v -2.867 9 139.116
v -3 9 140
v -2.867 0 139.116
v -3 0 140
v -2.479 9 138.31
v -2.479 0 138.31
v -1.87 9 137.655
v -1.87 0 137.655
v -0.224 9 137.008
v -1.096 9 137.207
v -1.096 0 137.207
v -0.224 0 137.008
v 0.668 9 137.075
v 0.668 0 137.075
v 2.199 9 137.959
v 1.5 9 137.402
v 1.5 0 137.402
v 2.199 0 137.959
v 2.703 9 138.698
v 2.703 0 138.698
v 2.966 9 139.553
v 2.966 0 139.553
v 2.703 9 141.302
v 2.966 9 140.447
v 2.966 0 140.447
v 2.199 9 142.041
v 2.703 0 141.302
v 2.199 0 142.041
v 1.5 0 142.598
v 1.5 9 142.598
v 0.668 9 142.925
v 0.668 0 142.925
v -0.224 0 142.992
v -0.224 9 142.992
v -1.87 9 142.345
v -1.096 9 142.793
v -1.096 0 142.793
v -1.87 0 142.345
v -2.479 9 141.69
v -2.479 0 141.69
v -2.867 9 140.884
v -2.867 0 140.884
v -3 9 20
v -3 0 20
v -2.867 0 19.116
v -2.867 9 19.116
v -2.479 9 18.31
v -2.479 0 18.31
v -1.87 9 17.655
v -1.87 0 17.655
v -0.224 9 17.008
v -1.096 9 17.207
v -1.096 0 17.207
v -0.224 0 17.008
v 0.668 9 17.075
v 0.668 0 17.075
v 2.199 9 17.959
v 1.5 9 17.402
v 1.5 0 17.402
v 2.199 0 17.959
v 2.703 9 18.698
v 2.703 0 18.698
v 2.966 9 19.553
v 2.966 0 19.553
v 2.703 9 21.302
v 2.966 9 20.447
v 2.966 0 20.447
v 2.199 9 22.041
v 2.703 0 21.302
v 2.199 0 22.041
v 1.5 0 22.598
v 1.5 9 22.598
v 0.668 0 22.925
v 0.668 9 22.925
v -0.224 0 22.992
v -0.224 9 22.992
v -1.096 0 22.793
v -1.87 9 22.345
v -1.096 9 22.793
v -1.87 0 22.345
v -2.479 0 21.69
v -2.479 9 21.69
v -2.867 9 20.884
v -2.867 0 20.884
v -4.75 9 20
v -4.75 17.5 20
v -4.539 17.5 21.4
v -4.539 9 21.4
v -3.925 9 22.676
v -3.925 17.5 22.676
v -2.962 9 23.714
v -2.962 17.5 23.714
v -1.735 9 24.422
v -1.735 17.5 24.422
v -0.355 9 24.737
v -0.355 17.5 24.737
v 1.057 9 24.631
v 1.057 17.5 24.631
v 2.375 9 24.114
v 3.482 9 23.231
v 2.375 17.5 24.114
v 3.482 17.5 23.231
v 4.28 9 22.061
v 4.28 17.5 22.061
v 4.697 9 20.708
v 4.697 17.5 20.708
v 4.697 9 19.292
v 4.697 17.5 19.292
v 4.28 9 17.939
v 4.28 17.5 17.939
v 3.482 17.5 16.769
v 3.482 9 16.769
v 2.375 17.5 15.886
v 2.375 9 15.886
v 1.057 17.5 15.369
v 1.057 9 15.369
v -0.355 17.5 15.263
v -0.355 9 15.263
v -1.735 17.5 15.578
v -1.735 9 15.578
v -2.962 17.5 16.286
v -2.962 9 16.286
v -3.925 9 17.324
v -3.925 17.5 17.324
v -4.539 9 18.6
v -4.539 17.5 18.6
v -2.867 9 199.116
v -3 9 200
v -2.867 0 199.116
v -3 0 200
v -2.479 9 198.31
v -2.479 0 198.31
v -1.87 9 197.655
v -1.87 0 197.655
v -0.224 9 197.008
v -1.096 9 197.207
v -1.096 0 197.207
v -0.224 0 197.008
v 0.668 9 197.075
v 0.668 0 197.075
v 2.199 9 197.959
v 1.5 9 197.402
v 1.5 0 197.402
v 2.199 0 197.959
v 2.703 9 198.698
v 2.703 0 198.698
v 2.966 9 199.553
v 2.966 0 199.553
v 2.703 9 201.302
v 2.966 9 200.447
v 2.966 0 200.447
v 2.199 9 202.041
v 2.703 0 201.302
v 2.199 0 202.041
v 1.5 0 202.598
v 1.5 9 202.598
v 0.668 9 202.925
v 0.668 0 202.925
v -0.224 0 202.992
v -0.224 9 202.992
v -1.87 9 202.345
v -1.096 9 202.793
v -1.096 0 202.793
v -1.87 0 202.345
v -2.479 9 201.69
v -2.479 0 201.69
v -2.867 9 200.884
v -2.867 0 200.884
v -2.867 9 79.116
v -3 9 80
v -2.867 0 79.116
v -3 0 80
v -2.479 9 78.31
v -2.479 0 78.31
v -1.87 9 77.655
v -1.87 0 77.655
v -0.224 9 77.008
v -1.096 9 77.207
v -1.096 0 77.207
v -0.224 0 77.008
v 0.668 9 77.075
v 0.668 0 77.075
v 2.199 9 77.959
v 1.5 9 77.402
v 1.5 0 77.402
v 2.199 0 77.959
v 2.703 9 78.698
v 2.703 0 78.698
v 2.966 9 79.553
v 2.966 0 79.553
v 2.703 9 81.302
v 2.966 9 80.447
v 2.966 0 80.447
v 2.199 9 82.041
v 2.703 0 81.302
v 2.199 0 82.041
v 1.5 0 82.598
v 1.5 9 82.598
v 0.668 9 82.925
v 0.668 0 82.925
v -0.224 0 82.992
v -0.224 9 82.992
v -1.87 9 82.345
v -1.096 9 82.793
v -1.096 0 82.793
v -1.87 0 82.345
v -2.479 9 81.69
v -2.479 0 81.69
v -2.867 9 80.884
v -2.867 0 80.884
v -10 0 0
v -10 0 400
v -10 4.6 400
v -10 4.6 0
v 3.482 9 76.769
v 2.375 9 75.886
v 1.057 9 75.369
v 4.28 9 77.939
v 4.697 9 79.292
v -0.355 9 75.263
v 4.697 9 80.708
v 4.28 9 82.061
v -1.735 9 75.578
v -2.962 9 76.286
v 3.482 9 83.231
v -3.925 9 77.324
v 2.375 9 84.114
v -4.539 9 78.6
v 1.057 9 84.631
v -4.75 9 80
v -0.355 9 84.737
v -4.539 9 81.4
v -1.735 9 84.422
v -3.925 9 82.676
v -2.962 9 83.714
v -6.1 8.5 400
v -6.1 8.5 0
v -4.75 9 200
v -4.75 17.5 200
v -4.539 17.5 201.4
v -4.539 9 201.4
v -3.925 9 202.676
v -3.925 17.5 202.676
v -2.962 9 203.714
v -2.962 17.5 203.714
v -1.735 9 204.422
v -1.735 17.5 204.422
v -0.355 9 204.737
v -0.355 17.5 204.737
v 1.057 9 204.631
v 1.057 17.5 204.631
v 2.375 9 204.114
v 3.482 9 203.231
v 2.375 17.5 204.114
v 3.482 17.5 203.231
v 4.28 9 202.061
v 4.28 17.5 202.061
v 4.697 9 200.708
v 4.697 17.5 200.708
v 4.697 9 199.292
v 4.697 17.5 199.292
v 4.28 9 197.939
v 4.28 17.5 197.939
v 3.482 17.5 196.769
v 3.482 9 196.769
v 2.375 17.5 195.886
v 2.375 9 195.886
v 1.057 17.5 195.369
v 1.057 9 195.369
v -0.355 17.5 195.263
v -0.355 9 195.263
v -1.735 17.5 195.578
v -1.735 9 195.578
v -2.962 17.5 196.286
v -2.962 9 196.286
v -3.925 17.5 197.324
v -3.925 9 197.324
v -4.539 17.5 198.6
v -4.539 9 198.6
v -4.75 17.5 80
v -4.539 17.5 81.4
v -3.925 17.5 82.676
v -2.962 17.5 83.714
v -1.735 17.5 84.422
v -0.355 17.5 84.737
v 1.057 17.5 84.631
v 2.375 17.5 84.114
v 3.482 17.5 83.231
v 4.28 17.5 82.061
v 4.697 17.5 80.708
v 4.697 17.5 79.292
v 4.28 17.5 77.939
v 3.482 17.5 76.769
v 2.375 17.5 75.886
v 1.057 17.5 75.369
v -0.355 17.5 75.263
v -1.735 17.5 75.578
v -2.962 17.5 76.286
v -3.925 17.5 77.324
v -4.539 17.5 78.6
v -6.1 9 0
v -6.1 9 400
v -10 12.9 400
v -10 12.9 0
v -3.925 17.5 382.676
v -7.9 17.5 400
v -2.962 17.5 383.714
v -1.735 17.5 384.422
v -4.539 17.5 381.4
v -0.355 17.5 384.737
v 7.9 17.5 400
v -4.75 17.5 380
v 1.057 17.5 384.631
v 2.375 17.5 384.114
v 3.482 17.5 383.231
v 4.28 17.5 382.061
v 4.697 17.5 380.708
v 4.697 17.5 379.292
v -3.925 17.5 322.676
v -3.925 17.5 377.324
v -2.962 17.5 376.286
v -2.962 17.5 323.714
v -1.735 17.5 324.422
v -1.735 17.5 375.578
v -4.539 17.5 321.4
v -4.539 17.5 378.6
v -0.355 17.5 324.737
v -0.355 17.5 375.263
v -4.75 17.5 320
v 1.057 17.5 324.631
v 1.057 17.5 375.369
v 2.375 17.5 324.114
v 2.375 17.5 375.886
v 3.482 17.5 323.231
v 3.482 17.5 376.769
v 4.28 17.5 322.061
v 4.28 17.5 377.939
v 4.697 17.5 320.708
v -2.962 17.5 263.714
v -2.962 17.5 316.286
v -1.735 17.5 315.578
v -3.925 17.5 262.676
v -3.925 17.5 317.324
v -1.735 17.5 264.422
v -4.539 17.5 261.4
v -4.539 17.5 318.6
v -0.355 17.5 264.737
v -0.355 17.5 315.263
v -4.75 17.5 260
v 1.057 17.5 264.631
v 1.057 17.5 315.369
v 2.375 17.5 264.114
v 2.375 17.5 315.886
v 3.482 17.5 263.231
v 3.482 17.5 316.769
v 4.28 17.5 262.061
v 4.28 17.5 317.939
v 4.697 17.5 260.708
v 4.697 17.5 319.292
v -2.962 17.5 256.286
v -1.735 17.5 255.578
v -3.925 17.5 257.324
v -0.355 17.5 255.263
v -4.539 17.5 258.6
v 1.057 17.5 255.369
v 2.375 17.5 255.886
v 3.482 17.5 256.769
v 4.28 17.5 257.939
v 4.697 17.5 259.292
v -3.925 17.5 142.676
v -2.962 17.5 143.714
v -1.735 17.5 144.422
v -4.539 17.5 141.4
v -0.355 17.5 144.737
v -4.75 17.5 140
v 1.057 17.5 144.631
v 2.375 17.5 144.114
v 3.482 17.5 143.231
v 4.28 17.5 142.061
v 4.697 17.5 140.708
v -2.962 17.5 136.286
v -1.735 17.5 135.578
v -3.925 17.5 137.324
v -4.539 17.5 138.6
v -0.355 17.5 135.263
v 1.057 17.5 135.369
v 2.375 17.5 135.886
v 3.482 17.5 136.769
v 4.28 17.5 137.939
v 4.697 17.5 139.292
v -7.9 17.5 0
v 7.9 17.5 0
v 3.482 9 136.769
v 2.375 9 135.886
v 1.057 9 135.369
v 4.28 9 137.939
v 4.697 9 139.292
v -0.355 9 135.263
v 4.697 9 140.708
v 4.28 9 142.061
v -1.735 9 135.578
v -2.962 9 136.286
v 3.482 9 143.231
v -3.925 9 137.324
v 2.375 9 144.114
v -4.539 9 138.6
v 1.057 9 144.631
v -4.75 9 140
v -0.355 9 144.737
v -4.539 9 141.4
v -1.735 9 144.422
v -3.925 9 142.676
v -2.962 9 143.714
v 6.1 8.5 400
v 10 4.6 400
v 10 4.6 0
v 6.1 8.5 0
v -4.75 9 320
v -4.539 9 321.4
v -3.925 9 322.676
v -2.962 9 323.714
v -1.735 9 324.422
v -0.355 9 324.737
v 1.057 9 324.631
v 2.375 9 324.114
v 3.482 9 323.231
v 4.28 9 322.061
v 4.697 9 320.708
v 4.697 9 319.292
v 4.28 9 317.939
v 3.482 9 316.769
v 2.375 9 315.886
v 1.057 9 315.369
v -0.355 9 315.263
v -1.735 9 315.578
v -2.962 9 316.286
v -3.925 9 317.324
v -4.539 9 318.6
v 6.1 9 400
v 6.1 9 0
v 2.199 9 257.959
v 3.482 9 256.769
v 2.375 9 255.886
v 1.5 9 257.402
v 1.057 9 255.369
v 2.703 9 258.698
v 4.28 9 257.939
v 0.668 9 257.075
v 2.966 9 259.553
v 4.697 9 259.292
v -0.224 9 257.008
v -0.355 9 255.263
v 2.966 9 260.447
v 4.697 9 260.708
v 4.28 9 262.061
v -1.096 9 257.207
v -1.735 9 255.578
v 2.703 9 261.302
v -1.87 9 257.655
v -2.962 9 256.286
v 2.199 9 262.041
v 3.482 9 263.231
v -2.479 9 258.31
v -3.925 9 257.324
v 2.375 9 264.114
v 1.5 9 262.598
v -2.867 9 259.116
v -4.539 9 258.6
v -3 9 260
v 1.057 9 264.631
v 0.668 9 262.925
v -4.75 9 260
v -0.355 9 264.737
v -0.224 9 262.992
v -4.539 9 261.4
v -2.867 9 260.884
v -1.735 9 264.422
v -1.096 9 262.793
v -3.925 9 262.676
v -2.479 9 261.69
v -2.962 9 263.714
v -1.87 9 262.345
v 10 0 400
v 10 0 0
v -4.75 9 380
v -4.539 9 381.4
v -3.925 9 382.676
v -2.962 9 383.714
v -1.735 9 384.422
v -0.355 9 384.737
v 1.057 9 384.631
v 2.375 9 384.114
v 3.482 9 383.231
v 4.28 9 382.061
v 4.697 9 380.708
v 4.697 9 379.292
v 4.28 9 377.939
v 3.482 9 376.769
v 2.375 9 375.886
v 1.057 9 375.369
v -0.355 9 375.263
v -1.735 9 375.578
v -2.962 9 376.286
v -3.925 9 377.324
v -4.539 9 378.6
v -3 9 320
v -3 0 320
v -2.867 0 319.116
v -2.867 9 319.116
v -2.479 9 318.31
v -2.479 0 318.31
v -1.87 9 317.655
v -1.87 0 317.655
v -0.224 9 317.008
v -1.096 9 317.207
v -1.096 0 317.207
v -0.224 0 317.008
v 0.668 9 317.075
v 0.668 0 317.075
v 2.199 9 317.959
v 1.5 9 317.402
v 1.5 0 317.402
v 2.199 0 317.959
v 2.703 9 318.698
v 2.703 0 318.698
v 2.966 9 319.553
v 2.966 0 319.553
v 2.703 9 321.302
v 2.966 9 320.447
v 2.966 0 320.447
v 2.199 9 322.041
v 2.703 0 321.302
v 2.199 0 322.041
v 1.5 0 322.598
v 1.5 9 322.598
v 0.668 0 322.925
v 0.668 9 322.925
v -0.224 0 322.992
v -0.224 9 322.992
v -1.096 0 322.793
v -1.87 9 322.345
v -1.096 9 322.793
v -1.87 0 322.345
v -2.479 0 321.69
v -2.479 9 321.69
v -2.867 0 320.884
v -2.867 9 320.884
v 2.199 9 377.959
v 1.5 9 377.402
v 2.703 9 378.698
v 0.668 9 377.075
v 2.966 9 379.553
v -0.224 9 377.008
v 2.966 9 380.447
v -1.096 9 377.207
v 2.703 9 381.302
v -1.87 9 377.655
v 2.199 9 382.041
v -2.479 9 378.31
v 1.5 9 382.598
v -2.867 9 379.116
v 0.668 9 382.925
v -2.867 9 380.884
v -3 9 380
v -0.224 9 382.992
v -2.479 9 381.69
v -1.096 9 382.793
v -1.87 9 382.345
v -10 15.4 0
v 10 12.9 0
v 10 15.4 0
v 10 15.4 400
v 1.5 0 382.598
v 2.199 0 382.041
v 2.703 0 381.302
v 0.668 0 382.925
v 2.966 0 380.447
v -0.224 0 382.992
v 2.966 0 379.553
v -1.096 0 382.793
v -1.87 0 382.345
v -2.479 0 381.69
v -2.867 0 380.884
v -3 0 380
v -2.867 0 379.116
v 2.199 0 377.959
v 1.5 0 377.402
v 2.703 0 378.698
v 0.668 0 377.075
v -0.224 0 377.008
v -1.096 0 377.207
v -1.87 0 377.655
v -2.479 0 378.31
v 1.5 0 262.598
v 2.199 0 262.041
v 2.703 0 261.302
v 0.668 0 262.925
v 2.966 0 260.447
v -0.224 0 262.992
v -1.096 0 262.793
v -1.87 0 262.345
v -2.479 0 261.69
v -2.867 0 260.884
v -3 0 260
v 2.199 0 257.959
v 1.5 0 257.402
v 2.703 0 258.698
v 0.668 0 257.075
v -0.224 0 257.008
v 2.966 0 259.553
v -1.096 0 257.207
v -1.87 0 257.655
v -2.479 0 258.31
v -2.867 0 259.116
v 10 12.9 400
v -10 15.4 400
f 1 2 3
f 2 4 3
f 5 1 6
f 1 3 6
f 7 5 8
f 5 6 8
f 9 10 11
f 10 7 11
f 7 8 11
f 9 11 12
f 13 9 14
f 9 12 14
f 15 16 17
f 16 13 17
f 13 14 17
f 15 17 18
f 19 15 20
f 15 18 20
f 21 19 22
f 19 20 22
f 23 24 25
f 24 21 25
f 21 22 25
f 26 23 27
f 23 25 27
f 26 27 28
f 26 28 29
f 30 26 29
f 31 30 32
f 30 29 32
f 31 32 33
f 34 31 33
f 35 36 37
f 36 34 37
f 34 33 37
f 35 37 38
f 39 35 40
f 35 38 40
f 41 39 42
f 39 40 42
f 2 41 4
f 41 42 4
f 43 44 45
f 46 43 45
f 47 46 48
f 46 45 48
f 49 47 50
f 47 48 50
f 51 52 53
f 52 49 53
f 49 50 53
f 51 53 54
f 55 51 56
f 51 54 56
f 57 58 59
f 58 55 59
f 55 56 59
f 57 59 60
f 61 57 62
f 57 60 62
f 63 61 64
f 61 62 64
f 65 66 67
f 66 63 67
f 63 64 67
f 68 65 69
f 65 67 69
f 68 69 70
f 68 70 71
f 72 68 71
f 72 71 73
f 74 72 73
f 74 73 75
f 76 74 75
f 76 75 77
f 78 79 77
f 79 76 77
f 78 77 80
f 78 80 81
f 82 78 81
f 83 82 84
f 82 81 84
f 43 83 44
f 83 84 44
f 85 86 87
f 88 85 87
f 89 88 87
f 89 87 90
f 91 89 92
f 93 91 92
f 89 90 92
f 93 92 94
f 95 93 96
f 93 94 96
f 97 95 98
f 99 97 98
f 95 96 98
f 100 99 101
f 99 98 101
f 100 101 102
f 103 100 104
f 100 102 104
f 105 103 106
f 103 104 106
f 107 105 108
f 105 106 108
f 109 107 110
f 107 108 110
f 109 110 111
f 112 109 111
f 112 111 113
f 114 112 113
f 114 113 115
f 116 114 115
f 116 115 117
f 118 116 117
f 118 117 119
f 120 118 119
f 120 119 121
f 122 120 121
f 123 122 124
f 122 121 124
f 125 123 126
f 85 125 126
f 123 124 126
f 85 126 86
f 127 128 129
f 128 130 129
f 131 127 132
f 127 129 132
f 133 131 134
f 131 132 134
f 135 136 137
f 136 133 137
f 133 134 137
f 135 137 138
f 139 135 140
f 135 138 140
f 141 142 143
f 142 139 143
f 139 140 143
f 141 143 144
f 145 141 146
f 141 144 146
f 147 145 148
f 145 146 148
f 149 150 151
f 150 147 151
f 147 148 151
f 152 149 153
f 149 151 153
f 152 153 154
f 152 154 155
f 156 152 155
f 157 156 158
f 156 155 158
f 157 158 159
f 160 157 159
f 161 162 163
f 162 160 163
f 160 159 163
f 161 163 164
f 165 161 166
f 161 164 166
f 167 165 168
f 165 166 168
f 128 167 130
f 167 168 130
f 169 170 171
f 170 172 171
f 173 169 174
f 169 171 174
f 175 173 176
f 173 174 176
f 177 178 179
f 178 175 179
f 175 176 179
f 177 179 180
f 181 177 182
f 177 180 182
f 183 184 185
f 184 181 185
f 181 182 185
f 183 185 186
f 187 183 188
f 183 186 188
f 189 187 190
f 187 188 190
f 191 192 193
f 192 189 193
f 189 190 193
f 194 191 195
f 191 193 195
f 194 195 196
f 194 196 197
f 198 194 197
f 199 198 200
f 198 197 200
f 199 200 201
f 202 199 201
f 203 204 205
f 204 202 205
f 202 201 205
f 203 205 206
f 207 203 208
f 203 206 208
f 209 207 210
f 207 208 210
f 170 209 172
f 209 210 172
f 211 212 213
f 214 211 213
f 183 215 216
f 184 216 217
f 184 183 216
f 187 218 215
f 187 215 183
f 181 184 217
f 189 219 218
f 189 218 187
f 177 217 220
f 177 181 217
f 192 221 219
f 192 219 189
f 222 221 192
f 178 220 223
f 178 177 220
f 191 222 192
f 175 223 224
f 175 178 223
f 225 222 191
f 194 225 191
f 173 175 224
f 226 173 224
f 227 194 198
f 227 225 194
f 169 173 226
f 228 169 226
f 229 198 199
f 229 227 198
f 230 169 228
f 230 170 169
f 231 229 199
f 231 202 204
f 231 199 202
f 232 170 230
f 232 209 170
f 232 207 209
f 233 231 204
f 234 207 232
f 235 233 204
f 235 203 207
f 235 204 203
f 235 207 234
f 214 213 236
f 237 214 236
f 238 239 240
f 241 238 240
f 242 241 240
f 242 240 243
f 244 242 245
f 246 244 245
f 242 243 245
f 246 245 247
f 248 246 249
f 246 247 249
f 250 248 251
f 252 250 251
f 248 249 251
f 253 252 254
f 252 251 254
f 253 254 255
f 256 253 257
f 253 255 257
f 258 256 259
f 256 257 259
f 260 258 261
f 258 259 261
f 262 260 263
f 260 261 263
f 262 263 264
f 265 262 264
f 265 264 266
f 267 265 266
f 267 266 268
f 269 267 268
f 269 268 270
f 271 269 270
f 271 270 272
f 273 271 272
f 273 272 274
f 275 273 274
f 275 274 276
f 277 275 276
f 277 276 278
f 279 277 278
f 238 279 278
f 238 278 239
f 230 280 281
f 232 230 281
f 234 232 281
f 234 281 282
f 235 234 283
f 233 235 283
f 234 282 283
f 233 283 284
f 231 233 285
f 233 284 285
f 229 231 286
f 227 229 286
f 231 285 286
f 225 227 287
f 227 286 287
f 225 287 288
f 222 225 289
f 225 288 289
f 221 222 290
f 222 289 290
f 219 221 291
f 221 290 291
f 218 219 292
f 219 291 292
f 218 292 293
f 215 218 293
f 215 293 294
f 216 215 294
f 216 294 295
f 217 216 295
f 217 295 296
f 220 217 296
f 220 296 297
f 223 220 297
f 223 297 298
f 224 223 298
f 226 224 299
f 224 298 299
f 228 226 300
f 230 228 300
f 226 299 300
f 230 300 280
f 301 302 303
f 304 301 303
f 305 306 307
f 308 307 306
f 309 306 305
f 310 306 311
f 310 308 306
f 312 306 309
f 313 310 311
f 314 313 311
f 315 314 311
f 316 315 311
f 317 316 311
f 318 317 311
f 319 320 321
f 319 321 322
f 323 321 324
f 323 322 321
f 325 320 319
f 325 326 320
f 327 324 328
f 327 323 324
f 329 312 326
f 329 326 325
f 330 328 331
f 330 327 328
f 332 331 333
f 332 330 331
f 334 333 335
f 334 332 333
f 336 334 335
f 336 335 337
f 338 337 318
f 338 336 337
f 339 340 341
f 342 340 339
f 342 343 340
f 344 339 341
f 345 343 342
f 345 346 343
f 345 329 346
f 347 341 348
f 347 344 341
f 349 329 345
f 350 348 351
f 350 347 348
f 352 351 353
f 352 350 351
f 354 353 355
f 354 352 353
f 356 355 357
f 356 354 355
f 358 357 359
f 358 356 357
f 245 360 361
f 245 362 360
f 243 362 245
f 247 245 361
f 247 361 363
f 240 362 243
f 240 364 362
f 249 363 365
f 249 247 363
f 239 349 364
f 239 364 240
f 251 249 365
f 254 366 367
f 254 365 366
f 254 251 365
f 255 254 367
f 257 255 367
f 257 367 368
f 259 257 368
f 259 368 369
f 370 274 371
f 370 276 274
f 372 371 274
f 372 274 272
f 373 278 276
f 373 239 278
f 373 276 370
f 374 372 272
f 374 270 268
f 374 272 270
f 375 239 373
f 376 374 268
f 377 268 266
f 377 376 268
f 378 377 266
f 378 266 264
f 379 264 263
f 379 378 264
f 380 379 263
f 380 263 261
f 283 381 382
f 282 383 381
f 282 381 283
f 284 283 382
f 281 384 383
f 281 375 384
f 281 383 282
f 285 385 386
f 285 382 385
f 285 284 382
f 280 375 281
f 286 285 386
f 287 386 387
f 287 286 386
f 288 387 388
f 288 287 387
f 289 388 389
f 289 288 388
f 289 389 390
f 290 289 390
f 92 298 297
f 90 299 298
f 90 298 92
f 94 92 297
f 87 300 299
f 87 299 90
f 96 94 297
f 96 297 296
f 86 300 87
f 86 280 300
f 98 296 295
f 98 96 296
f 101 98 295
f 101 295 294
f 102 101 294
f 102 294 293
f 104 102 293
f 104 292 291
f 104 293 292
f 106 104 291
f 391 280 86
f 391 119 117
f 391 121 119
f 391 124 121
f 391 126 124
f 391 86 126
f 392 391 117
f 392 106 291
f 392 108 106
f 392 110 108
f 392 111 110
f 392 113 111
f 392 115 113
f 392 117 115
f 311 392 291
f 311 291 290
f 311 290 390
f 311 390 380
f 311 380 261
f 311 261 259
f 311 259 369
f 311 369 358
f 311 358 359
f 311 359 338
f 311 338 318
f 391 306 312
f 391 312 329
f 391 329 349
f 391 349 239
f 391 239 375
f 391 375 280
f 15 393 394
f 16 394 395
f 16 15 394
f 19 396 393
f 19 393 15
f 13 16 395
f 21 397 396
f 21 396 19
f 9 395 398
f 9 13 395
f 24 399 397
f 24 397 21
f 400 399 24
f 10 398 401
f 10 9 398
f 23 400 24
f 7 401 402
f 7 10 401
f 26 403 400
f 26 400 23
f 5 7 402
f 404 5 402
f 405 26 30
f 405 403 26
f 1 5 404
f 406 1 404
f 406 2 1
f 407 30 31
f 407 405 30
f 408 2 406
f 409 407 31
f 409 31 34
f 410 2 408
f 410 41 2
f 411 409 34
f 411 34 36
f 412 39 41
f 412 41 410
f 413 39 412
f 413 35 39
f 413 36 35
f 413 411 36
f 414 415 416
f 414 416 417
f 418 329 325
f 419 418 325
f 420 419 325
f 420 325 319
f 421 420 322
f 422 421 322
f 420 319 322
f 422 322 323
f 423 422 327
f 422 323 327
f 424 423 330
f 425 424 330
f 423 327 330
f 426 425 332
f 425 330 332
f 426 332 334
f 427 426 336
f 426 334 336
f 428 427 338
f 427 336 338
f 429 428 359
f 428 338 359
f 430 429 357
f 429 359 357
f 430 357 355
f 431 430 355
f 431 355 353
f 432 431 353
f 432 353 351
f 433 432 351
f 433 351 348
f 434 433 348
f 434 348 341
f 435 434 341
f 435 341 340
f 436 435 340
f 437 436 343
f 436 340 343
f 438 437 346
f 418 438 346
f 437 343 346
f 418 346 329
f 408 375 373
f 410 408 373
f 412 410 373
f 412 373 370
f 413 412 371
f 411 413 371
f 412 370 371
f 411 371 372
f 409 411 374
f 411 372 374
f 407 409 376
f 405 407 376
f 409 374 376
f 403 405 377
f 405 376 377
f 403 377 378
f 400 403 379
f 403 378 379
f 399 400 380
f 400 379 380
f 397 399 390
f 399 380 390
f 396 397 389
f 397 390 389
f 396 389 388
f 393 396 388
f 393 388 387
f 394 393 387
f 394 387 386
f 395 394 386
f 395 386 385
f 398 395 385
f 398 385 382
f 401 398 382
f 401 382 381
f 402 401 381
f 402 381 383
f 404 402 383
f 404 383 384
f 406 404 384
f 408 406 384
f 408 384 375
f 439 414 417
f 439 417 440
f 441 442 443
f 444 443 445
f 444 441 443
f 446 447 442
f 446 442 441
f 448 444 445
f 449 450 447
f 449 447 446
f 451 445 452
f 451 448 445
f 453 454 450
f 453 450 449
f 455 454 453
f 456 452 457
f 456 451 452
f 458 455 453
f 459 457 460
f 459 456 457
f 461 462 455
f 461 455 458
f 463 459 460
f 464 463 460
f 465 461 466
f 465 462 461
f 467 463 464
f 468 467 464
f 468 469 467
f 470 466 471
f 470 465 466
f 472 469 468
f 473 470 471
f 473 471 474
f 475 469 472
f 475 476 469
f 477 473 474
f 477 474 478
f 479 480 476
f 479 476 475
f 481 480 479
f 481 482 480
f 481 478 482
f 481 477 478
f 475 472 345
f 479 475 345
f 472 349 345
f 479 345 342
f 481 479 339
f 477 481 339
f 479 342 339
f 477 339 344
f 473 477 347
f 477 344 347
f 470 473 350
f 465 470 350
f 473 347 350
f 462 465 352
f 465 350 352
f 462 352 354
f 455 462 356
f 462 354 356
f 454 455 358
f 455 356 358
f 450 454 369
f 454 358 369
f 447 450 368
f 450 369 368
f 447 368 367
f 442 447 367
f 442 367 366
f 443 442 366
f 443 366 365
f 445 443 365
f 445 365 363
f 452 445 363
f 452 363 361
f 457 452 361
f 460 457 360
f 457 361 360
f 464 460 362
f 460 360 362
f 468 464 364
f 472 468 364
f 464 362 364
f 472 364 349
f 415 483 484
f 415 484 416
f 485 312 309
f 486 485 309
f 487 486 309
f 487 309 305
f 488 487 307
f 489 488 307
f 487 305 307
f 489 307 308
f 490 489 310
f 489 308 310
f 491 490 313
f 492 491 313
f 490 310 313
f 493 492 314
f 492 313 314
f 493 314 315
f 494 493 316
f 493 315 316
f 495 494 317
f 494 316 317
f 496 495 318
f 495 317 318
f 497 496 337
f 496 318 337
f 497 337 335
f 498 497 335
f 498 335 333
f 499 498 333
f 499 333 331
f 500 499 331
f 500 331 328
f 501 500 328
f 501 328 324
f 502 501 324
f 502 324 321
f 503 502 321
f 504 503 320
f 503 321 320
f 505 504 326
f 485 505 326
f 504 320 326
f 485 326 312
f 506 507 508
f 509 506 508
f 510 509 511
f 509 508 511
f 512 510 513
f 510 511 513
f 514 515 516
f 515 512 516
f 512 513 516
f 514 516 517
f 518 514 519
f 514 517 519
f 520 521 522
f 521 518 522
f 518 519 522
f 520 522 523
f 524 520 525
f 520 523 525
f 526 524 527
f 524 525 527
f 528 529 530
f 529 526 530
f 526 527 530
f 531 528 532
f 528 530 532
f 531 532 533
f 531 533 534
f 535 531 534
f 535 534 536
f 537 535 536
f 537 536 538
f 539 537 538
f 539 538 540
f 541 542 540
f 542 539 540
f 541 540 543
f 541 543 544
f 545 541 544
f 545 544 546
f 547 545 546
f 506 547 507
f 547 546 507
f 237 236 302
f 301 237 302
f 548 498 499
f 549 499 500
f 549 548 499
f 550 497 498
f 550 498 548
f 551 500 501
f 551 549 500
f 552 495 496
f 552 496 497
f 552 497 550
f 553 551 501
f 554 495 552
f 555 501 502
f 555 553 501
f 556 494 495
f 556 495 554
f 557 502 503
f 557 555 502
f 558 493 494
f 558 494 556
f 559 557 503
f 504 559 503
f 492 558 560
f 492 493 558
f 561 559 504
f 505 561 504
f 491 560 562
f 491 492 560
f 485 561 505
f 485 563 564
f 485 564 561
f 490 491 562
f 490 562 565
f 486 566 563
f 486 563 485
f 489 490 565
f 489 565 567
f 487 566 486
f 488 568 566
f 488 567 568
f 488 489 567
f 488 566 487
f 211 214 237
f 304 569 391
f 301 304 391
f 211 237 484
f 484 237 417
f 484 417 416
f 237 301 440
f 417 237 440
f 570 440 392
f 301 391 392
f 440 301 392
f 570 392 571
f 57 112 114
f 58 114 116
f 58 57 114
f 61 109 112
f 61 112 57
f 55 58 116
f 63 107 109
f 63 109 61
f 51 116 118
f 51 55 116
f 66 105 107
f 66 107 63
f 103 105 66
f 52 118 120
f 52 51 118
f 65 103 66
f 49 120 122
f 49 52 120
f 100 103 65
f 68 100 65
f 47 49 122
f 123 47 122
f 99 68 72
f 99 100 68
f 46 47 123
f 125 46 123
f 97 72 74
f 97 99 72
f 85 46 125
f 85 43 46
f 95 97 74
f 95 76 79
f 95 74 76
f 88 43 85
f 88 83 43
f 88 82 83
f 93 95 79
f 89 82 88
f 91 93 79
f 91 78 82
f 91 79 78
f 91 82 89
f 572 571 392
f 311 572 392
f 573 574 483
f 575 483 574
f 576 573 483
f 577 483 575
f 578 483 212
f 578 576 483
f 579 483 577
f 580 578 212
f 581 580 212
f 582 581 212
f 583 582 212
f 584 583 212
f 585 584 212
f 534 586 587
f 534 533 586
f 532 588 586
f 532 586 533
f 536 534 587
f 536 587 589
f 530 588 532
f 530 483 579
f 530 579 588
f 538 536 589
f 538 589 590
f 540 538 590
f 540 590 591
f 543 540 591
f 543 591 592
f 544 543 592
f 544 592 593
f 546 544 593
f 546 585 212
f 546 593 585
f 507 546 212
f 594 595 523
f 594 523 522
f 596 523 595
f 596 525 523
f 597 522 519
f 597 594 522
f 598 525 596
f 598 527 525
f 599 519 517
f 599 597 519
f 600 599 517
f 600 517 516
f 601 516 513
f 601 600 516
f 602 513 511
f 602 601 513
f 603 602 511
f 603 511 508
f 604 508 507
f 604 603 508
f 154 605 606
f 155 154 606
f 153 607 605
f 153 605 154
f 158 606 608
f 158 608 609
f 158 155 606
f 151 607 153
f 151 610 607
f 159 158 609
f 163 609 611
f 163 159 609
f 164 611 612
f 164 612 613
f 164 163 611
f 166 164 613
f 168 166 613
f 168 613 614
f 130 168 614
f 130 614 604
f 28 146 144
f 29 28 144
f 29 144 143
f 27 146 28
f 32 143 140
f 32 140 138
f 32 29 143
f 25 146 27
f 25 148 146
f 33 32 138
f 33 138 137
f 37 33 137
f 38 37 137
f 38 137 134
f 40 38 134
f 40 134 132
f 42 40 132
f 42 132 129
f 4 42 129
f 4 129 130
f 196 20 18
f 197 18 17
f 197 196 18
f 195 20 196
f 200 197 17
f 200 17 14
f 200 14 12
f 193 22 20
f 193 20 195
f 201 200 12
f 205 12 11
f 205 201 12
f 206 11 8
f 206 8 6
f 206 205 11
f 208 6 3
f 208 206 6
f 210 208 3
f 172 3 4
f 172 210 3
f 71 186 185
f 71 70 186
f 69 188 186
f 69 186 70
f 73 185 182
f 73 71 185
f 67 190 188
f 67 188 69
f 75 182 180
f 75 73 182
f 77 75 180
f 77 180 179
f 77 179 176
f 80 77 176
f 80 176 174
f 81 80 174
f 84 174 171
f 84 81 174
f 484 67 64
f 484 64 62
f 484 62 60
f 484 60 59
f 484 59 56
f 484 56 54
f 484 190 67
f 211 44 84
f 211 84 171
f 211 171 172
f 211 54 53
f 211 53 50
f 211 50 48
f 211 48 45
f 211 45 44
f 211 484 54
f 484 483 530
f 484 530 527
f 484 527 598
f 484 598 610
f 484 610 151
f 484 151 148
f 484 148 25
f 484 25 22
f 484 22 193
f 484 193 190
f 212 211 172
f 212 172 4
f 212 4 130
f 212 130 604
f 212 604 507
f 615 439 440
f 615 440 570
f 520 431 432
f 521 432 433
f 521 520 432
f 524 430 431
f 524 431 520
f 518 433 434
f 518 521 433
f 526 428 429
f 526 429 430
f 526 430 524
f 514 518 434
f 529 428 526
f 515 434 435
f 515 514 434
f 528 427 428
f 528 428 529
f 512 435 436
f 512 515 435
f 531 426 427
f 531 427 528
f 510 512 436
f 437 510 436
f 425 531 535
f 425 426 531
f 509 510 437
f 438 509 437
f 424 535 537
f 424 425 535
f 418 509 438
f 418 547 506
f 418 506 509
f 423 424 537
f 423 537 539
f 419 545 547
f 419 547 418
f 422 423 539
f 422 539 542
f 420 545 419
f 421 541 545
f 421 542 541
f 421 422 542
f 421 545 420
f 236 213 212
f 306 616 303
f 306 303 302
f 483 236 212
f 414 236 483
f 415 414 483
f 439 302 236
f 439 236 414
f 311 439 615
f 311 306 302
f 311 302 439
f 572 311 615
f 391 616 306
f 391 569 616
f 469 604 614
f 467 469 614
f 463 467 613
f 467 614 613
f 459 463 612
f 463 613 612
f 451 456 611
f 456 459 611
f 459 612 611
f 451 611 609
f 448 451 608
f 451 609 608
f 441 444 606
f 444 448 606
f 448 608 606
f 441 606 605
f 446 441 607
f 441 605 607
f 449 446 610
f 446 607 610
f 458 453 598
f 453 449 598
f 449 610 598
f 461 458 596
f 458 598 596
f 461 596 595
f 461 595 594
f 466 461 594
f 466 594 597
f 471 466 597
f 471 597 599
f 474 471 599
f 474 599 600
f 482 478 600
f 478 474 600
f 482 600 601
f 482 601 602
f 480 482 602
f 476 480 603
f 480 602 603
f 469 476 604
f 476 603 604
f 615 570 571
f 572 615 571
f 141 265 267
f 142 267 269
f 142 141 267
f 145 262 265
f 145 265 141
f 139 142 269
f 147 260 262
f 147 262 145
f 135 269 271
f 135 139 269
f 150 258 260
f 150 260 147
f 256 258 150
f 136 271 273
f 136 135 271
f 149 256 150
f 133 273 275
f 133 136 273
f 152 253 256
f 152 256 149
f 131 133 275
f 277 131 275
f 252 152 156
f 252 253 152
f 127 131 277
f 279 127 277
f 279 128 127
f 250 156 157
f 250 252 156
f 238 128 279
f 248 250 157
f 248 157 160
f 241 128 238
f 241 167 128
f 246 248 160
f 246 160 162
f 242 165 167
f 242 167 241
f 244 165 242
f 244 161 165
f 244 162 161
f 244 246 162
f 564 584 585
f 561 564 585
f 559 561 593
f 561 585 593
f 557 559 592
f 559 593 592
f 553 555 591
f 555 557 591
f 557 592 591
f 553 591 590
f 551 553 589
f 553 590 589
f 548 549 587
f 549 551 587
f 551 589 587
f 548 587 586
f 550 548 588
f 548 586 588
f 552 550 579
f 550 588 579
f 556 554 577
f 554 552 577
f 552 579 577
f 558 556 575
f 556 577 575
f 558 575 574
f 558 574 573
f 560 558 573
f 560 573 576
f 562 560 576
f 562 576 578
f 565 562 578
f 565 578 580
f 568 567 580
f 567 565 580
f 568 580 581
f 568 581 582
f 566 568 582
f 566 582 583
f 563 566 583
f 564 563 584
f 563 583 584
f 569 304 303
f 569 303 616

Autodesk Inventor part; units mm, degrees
ref_plane "YZ Plane" through (0, 0, 0) normal (1, 0, 0) x (0, 1, 0)
ref_plane "XZ Plane" through (0, 0, 0) normal (0, 1, 0) x (-1, 0, 0)
ref_plane "XY Plane" through (0, 0, 0) normal (0, 0, 1) x (1, 0, 0)
sketch "Sketch1" plane through (0, 0, 0) normal (0, 0, 1) x (1, 0, 0)
  line L0 (0, 0) -> (0, 17.5) construction
  line L1 (0, 0) -> (-10, 0)
  line L2 (0, 0) -> (10, 0)
  line L3 (-10, 0) -> (-10, 4.6)
  line L4 (-10, 4.6) -> (-6.1, 8.5)
  line L5 (-6.1, 8.5) -> (-6.1, 9)
  line L6 (-6.1, 9) -> (-10, 12.9)
  line L7 (-10, 12.9) -> (-10, 15.4)
  line L8 (-10, 15.4) -> (-7.9, 17.5)
  line L9 (-7.9, 17.5) -> (0, 17.5)
  line L10 (10, 0) -> (10, 4.6)
  line L11 (10, 4.6) -> (6.1, 8.5)
  line L12 (6.1, 8.5) -> (6.1, 9)
  line L13 (6.1, 9) -> (10, 12.9)
  line L14 (10, 12.9) -> (10, 15.4)
  line L15 (10, 15.4) -> (7.9, 17.5)
  line L16 (7.9, 17.5) -> (0, 17.5)
  dimension "d0" = 17.5
  dimension "d1" = 20
  dimension "d2" = 4.6
  dimension "d3" = 8.5
  dimension "d8" = 135
  dimension "d9" = 0.5
  dimension "d10" = 135
  dimension "d11" = 2.5
extrude "Extrusion1" add sketch "Sketch1" along normal blind 400
sketch "Sketch2" plane through (0, 0, 0) normal (0, 1, 0) x (-1, 0, 0)
  line L0 (0, 0) -> (0, 20) construction
  line L1 (0, 20) -> (0, 80) construction
  circle A0 centre (0, 20) radius 4.75
  circle A1 centre (0, 20) radius 3
  dimension "d14" = 20
  dimension "d15" = 60
  dimension "d16" = 9.5
  dimension "d17" = 6
extrude "Extrusion2" cut sketch "Sketch2" along normal through all contours A1
extrude "Extrusion3" cut sketch "Sketch2" against normal blind 8.5 from surface at 17.5
pattern_linear "Rectangular Pattern1" count 9 spacing 60 along (0, 0, 1) of "Extrusion2", "Extrusion3"
properties part number "HGR20 400mm"
